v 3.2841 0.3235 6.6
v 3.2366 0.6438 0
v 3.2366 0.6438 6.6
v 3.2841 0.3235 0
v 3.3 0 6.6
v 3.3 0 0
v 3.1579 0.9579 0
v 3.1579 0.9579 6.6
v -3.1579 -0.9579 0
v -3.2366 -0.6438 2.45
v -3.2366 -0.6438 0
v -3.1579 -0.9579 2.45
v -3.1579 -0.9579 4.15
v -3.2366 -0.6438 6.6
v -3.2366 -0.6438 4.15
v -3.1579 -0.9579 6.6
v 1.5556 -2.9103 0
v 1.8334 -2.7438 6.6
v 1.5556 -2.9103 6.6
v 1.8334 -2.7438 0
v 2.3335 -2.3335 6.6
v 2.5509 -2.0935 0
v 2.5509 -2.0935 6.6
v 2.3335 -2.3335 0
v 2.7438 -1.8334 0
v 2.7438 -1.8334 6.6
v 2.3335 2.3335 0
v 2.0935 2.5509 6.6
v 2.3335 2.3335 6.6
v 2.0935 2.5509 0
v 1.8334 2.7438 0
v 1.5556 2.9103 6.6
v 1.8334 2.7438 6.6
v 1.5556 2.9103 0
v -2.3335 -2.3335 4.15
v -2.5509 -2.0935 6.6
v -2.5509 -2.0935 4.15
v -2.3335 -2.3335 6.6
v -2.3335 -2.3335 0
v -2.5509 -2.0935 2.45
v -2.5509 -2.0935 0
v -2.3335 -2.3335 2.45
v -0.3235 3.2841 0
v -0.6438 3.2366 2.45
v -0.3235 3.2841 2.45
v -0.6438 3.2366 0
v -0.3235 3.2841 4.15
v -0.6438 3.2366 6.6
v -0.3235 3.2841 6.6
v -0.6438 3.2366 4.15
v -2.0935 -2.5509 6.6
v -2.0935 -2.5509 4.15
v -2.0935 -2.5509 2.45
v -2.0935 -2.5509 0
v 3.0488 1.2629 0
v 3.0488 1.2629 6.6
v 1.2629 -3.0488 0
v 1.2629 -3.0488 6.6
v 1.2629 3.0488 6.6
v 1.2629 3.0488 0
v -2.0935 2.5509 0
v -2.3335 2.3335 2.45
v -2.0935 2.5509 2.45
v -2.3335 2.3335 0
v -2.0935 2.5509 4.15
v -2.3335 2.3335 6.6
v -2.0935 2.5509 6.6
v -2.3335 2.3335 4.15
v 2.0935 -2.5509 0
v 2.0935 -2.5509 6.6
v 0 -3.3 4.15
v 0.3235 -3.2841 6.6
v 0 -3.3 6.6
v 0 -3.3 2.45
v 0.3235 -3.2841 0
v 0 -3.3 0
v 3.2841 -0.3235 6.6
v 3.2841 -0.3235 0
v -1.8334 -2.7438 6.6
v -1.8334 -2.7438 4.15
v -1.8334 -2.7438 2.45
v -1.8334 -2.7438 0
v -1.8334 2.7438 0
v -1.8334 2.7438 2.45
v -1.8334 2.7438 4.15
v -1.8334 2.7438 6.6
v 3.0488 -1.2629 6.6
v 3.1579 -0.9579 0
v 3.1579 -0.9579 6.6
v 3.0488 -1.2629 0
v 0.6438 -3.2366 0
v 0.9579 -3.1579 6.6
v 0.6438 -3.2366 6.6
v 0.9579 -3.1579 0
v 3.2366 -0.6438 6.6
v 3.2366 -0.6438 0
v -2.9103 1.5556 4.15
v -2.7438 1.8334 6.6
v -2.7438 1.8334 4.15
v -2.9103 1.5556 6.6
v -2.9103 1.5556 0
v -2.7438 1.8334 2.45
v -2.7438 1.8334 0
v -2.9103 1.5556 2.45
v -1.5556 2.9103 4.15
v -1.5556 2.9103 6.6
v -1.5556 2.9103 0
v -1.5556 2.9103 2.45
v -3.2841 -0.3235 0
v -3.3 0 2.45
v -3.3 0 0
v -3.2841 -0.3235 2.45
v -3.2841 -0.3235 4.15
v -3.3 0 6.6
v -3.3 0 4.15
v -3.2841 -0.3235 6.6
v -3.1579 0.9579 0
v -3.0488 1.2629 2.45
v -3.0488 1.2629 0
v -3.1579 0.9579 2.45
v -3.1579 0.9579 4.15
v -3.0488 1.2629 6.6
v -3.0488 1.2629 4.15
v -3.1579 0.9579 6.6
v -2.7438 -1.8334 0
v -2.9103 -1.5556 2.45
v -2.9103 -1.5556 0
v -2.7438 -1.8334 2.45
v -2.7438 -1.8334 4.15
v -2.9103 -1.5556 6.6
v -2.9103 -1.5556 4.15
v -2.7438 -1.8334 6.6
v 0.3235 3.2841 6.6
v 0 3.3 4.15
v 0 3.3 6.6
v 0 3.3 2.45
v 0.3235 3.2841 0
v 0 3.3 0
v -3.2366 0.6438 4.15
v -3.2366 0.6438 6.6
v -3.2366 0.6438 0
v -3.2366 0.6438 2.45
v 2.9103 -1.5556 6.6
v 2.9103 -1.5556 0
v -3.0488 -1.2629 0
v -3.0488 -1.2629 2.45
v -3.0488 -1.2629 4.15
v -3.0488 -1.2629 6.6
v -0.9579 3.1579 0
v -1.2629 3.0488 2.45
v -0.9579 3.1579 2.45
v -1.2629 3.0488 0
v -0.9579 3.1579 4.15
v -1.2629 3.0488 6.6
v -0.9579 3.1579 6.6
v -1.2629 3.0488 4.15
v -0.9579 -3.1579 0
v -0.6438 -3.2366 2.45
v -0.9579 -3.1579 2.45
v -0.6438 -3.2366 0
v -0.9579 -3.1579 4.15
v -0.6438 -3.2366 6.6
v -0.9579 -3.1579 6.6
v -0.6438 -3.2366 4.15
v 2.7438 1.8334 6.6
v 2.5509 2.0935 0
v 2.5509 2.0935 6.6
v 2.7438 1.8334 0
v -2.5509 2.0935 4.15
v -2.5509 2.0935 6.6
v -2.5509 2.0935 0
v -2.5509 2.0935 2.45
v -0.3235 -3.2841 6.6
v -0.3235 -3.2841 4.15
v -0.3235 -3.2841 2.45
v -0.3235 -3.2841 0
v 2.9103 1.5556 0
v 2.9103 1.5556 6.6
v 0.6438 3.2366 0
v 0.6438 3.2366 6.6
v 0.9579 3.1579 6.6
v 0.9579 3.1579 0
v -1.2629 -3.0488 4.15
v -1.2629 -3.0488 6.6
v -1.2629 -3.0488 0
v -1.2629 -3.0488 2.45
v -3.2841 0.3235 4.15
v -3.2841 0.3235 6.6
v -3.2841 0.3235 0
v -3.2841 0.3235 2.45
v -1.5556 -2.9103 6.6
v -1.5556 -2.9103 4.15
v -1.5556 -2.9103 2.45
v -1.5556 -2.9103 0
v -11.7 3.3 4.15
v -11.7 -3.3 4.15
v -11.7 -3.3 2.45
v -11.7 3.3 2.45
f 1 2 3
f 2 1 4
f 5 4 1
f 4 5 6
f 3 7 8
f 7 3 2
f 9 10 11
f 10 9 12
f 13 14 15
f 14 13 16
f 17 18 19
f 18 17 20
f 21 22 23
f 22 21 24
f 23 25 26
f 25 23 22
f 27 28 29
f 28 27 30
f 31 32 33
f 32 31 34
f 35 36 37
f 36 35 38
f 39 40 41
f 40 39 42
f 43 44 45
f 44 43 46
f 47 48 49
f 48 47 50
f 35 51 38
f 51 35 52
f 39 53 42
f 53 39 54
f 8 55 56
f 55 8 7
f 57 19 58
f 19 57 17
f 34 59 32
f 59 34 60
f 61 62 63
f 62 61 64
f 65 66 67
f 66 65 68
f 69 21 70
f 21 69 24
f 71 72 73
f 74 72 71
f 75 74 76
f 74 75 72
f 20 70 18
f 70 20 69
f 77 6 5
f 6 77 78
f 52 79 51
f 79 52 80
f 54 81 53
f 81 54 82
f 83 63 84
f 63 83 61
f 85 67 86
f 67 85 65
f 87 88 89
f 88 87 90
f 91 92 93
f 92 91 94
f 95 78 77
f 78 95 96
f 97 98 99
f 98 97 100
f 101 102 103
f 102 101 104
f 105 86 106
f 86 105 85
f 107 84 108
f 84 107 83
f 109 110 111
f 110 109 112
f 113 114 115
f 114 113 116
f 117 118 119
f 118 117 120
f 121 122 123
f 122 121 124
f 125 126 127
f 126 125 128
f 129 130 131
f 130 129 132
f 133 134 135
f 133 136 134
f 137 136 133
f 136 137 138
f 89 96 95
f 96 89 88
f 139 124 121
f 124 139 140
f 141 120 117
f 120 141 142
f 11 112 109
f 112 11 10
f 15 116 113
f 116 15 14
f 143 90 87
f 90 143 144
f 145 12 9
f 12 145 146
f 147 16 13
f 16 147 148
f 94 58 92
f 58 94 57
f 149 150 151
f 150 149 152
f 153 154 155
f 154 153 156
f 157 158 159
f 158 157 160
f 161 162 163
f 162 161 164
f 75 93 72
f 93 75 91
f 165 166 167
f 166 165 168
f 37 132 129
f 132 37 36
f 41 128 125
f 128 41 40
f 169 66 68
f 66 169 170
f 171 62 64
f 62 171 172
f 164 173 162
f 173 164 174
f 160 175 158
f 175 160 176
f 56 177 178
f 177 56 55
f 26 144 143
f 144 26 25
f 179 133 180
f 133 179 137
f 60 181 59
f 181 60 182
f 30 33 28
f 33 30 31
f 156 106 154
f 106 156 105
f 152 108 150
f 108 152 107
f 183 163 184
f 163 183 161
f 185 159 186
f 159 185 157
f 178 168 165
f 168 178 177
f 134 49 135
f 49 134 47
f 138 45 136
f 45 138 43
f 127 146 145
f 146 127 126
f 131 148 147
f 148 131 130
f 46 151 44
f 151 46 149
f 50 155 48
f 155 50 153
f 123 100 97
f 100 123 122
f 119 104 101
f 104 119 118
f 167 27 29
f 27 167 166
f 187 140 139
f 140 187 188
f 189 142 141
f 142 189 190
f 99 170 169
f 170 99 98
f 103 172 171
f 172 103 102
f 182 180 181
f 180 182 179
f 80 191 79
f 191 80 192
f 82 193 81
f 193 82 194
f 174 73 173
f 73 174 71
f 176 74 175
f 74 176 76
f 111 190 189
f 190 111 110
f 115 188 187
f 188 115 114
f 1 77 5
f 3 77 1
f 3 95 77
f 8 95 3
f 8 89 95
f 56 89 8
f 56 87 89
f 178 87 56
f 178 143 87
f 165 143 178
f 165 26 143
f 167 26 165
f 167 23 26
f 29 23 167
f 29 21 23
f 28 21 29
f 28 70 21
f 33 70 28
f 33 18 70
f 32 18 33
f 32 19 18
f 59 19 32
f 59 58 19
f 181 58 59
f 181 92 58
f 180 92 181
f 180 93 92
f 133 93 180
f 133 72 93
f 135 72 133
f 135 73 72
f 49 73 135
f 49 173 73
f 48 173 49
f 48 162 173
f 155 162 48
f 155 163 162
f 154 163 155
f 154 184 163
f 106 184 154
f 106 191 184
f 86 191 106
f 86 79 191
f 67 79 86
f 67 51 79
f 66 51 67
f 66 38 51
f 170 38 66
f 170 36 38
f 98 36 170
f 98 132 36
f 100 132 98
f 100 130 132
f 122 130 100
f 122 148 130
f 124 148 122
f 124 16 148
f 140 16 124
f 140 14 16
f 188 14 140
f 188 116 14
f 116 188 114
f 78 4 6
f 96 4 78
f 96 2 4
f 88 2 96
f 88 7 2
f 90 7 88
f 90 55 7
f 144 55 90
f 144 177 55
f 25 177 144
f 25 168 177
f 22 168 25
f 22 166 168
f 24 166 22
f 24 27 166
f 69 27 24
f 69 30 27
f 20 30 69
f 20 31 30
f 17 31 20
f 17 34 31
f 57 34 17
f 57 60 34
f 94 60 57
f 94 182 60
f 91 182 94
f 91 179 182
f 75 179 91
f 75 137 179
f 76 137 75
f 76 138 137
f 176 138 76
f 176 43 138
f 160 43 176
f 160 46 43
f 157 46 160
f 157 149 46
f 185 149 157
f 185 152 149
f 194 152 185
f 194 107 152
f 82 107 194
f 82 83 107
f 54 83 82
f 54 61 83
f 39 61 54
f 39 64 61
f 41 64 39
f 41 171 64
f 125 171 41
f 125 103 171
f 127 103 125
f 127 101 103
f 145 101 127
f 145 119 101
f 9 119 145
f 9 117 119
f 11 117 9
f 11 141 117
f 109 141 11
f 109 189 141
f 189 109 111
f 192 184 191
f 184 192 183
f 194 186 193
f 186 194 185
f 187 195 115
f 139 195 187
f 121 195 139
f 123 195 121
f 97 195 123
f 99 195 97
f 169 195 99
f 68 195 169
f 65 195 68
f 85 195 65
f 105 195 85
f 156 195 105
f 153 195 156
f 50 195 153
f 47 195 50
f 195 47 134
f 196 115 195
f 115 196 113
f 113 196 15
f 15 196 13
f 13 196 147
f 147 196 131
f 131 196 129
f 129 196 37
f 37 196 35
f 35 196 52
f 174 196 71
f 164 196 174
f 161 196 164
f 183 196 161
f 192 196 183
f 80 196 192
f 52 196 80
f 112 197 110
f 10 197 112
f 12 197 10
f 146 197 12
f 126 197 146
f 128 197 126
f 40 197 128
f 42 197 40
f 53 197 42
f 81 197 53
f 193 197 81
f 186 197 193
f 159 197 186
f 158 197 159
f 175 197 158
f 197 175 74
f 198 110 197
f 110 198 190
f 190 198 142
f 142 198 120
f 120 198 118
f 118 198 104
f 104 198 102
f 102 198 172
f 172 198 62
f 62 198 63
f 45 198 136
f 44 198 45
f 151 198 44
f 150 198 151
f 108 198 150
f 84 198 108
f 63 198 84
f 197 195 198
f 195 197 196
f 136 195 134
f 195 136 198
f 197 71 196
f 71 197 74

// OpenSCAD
module spool() {
    cylinder(h=6.6, d=6.6, $fn=64);
    translate([-5.85, 0, 3.3])
        cube([11.7, 6.6, 1.7], center=true);
}

spool();
